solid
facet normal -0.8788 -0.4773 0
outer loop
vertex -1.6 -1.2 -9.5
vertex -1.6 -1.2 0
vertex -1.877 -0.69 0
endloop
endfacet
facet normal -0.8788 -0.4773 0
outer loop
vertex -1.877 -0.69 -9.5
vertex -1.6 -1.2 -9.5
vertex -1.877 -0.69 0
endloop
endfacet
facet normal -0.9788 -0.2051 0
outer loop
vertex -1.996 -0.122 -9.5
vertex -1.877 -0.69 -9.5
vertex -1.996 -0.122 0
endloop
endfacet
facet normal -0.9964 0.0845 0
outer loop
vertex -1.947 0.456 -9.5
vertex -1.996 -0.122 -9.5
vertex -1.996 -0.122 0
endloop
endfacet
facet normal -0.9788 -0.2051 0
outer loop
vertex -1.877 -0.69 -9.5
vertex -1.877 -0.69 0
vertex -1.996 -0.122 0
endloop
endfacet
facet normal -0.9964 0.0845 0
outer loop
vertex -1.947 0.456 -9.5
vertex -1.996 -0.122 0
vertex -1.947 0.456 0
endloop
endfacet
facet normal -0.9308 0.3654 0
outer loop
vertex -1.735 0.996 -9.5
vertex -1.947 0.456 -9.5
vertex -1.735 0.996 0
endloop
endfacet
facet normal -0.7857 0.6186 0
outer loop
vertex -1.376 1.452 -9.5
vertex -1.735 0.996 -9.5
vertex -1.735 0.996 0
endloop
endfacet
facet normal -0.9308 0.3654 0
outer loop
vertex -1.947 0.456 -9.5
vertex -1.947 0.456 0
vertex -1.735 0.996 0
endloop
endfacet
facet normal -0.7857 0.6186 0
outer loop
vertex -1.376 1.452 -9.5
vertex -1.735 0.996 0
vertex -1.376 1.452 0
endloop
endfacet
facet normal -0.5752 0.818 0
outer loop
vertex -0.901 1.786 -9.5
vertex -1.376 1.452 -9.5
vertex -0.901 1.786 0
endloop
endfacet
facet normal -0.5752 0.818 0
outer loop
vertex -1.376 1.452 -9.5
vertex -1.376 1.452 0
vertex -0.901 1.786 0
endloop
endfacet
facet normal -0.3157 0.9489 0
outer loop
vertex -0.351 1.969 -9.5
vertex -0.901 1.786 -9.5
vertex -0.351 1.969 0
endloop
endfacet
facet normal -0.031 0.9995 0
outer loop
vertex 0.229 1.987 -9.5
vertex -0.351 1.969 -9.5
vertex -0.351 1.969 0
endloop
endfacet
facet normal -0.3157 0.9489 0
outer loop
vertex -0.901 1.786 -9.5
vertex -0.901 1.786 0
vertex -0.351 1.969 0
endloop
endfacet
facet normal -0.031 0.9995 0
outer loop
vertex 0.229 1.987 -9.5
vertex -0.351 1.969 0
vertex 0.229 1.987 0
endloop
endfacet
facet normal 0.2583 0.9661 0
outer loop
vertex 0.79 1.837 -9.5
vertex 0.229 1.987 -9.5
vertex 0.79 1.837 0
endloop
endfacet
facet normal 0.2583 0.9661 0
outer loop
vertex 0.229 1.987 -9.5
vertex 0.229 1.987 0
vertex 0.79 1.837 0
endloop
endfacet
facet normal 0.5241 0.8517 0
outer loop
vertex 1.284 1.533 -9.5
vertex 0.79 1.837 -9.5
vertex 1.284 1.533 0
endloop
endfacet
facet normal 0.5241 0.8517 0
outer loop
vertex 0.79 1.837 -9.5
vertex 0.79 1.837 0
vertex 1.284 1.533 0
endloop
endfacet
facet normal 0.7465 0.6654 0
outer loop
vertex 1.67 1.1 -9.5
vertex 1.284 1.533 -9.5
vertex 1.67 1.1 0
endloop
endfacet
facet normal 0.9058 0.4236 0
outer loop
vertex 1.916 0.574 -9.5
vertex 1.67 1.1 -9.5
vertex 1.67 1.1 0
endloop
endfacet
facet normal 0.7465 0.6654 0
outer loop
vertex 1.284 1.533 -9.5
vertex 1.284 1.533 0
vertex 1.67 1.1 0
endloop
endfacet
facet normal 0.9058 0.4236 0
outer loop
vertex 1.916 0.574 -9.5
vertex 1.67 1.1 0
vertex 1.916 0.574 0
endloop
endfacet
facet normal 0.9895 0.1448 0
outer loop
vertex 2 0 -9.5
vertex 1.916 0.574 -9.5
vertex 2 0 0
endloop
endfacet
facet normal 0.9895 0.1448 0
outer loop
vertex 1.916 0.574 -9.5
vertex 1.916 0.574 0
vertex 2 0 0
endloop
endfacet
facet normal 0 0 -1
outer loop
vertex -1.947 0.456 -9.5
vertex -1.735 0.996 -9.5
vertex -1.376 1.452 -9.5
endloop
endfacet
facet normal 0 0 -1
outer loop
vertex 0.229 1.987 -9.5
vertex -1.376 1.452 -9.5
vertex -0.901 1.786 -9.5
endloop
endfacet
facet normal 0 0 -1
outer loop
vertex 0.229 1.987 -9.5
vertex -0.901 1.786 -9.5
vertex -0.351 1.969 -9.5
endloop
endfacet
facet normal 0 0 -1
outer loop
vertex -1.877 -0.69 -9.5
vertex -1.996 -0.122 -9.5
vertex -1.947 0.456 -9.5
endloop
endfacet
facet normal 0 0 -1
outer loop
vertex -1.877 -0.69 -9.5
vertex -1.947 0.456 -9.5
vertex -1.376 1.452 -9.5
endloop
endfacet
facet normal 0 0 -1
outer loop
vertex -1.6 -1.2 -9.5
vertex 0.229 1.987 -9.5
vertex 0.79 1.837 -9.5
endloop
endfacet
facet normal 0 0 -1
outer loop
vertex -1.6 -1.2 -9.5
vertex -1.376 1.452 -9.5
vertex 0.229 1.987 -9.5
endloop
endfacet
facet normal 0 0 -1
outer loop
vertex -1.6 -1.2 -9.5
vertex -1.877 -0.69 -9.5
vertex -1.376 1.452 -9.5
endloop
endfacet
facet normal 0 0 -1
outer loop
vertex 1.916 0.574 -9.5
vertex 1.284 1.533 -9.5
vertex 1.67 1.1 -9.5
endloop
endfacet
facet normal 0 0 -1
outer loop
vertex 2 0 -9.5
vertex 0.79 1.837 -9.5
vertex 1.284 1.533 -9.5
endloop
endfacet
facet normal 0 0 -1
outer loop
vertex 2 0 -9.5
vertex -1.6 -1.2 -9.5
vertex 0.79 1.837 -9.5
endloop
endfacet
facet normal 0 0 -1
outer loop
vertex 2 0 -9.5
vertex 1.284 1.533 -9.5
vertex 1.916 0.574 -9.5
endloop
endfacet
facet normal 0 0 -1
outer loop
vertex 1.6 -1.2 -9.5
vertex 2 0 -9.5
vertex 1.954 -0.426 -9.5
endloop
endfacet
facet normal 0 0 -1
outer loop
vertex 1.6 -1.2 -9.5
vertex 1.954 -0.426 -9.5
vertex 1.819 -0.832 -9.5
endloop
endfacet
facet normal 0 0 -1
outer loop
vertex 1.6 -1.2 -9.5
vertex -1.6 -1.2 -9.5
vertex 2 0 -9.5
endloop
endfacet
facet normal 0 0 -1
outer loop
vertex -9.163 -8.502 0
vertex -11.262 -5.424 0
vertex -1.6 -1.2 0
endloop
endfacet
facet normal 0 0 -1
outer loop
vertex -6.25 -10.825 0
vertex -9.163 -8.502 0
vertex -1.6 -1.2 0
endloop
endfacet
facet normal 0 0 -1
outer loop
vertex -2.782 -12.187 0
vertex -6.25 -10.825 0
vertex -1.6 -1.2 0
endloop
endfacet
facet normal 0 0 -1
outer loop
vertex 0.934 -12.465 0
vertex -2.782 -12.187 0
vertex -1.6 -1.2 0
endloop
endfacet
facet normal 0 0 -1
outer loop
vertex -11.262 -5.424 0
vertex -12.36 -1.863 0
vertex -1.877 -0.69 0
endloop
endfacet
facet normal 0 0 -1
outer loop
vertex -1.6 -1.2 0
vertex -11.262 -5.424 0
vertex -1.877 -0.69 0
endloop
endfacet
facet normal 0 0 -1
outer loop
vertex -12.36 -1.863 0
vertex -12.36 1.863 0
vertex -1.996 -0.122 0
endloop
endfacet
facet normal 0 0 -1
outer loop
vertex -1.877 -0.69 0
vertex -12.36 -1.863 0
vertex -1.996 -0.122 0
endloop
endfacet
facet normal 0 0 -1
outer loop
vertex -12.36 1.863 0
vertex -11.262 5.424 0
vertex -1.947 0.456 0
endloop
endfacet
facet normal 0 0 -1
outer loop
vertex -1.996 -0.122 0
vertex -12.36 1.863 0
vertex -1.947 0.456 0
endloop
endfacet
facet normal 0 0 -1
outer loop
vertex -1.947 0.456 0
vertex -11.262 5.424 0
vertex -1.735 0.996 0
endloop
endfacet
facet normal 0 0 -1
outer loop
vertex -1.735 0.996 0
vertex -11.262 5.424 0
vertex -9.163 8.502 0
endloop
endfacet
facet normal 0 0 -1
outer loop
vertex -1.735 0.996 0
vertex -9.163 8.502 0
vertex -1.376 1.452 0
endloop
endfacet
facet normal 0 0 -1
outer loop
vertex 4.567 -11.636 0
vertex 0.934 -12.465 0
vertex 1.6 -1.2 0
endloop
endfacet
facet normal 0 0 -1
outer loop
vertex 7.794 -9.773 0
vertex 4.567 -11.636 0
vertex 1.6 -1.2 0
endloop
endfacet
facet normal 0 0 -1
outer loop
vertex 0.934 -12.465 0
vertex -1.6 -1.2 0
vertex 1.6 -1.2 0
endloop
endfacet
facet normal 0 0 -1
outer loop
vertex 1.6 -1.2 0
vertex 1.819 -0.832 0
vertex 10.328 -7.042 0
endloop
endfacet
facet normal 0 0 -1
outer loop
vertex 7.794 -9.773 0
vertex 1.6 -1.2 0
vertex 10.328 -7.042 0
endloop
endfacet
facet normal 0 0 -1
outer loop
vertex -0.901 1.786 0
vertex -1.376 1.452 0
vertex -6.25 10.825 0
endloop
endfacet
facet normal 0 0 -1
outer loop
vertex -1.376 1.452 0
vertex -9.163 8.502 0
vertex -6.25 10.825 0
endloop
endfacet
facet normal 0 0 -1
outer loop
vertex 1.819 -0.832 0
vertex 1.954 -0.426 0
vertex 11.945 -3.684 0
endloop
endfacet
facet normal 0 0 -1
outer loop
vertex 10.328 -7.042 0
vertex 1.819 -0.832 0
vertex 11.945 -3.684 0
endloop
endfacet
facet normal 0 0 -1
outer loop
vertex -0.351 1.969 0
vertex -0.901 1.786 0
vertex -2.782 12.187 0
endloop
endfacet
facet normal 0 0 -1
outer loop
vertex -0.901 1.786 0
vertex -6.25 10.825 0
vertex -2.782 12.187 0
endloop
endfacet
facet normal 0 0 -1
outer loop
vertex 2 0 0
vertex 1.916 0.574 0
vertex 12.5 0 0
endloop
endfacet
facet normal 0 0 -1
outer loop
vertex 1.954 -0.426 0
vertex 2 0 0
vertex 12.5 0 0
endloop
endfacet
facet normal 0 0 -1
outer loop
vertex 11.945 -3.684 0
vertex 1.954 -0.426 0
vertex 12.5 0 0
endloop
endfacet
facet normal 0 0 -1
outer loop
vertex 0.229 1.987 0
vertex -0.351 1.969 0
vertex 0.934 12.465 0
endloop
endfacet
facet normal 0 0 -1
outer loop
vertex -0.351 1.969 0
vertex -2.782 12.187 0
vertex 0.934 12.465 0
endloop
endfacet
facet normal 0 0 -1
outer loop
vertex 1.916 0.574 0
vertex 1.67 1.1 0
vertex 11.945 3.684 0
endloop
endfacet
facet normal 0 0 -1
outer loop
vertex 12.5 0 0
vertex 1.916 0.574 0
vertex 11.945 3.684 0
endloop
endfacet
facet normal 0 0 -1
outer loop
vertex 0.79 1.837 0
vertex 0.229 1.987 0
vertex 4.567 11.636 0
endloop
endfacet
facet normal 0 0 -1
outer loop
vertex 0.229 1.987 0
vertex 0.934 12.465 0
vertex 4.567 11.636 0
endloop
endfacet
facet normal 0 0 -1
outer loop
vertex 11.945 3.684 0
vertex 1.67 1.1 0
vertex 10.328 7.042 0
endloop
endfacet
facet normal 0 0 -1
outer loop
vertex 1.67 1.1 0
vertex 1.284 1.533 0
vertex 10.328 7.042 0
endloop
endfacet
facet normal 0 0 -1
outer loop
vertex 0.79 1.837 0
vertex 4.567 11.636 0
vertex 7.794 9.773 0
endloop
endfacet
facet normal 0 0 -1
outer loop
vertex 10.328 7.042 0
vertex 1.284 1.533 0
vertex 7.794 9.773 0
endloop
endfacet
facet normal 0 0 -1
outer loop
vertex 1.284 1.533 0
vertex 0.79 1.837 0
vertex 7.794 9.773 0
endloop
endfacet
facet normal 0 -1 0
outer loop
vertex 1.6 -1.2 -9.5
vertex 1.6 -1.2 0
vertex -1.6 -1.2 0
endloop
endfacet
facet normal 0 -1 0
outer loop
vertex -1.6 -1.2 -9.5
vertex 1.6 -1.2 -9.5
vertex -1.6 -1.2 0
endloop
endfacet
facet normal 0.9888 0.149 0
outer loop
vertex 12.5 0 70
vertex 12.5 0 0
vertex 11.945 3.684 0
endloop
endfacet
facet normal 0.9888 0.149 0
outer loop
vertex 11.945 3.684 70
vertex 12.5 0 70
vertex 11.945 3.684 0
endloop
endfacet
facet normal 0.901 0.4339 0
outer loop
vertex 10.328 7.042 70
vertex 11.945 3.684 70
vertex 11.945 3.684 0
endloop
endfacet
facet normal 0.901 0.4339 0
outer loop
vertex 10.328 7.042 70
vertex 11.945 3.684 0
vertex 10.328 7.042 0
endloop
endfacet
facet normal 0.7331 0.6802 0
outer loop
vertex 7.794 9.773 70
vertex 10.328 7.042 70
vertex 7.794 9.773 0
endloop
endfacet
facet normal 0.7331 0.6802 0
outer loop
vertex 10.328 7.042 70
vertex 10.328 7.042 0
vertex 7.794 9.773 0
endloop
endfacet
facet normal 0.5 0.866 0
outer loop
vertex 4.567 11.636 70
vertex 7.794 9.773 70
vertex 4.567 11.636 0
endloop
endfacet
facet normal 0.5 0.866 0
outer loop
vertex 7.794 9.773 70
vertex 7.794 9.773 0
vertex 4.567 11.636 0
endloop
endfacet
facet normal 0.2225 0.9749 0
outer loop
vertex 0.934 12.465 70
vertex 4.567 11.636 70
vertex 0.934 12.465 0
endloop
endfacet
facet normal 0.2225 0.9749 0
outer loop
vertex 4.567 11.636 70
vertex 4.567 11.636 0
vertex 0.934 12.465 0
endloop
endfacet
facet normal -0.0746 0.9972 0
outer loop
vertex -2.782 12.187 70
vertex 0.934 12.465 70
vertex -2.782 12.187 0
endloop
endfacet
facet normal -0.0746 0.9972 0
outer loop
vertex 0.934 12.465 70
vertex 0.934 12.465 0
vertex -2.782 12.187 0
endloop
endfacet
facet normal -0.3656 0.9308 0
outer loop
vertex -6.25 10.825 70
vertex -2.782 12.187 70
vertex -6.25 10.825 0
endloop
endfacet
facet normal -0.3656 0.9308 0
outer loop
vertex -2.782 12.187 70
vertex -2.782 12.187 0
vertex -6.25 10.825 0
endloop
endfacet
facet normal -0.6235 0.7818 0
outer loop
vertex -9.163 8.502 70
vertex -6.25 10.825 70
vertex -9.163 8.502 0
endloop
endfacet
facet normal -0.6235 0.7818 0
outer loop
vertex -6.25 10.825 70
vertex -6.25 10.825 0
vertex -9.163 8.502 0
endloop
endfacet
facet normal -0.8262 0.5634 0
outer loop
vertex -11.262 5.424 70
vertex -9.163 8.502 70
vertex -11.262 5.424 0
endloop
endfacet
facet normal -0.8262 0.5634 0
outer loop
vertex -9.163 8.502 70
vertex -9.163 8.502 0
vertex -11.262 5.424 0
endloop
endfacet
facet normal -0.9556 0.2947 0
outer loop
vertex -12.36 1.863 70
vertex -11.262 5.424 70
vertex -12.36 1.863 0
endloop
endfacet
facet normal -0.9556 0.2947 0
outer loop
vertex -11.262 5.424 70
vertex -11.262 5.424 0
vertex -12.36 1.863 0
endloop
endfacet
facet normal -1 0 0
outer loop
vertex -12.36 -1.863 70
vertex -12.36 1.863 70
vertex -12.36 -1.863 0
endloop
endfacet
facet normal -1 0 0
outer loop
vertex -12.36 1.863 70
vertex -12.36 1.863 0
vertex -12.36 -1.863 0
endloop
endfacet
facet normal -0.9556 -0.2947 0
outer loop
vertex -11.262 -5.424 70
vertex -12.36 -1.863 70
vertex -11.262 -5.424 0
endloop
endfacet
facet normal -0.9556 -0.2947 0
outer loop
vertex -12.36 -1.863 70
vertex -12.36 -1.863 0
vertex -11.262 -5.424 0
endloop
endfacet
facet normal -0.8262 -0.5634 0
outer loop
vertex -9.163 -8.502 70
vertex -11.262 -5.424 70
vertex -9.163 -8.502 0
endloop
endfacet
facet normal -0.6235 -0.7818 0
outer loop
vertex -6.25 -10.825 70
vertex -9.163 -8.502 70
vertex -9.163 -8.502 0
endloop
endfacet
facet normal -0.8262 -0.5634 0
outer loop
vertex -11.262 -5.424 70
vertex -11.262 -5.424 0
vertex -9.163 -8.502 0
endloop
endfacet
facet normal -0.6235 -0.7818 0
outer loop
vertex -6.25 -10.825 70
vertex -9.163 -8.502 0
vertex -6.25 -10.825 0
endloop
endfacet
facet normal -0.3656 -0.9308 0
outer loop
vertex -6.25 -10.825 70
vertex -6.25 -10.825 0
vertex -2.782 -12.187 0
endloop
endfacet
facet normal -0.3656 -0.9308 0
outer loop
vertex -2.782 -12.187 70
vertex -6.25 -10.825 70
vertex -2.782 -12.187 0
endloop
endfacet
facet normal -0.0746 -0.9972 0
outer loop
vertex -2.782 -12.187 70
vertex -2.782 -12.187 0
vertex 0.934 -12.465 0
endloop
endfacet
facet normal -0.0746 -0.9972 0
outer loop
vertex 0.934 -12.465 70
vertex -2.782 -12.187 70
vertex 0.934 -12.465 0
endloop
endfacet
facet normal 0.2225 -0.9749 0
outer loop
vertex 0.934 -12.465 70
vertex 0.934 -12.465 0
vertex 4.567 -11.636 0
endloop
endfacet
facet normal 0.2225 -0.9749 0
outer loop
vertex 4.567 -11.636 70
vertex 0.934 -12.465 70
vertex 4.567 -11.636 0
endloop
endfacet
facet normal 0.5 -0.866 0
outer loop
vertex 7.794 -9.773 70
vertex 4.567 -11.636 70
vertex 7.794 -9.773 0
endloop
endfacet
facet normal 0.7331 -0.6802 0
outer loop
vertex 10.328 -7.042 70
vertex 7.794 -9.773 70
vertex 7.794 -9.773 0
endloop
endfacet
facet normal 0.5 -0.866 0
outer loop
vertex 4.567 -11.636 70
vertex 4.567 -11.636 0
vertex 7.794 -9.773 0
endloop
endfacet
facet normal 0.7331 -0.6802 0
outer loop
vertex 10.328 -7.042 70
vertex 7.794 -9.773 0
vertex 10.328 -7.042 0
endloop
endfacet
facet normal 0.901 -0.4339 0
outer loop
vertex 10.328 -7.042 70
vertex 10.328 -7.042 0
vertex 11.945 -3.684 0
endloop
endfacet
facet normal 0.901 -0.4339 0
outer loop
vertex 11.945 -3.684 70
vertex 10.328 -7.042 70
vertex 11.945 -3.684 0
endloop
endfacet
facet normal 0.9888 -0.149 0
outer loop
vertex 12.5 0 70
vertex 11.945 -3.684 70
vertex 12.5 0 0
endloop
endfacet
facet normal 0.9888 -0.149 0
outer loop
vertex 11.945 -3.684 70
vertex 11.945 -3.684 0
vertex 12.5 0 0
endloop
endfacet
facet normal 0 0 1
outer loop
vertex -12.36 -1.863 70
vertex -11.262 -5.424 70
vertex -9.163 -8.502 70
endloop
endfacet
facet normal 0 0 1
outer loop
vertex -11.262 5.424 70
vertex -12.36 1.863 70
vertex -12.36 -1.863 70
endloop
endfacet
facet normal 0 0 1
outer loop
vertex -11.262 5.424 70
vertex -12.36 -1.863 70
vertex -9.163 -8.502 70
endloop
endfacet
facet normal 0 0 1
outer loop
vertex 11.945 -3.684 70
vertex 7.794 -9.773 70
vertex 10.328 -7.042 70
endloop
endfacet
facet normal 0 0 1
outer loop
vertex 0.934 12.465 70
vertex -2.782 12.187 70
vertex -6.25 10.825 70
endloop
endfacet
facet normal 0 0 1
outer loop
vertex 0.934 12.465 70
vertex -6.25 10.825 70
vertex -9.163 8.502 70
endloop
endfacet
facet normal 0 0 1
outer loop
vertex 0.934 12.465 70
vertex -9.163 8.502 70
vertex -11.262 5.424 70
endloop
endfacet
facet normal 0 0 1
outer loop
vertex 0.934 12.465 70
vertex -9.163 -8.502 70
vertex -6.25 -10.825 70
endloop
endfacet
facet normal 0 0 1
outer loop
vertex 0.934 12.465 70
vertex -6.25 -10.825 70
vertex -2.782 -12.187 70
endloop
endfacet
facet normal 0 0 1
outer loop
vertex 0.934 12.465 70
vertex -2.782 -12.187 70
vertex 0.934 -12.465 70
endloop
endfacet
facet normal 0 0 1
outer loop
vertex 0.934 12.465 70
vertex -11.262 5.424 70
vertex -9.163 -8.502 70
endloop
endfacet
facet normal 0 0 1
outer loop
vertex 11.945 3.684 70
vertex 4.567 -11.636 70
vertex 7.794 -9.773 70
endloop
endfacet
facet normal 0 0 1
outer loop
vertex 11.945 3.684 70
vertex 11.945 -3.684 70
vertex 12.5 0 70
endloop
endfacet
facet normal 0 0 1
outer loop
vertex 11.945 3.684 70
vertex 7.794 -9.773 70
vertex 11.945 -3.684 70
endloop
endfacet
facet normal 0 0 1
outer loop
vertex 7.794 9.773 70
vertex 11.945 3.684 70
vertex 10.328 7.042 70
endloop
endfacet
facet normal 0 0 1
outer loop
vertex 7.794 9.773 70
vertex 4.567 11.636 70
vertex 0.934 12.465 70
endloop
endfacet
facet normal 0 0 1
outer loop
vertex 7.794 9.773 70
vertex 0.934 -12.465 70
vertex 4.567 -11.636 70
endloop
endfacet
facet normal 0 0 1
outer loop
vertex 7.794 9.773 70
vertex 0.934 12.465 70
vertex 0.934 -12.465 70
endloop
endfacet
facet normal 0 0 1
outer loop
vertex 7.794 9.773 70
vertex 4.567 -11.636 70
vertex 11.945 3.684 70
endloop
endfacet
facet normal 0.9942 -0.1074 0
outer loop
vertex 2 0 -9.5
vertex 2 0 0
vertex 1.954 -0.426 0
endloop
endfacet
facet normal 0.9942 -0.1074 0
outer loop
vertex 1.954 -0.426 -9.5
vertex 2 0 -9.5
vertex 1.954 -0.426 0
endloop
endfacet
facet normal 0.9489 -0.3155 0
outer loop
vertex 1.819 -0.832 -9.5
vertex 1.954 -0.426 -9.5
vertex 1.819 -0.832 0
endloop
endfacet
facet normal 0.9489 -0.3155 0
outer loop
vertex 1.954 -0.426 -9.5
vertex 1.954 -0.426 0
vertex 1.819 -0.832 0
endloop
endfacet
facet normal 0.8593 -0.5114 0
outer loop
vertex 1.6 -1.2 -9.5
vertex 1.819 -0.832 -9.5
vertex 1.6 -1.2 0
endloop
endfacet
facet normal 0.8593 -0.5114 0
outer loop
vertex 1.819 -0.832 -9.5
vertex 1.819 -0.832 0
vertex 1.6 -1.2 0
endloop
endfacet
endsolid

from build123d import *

# Parameters (mm, degrees)
F0_R     = 12.5
F1_DEPTH = 70
F3_DEPTH = 9.5


with BuildPart() as f1:
    # F0 (on Top) → F1 (new body)
    with BuildSketch(Plane.XY):
        Circle(F0_R)
    extrude(amount=F1_DEPTH)

    # F2 (on face) → F3 (join)
    with BuildSketch(Plane(origin=(0, 0, 0), x_dir=(1, 0, 0), z_dir=(0, 0, -1))):
        with BuildLine():
            ThreePointArc((-1.6, 1.2), (-0.632456, -1.897367), (2, 0))
            ThreePointArc((2, 0), (1.897367, 0.632456), (1.6, 1.2))
            Line((1.6, 1.2), (-1.6, 1.2))
        make_face()
    extrude(amount=F3_DEPTH)


solid = f1.part
